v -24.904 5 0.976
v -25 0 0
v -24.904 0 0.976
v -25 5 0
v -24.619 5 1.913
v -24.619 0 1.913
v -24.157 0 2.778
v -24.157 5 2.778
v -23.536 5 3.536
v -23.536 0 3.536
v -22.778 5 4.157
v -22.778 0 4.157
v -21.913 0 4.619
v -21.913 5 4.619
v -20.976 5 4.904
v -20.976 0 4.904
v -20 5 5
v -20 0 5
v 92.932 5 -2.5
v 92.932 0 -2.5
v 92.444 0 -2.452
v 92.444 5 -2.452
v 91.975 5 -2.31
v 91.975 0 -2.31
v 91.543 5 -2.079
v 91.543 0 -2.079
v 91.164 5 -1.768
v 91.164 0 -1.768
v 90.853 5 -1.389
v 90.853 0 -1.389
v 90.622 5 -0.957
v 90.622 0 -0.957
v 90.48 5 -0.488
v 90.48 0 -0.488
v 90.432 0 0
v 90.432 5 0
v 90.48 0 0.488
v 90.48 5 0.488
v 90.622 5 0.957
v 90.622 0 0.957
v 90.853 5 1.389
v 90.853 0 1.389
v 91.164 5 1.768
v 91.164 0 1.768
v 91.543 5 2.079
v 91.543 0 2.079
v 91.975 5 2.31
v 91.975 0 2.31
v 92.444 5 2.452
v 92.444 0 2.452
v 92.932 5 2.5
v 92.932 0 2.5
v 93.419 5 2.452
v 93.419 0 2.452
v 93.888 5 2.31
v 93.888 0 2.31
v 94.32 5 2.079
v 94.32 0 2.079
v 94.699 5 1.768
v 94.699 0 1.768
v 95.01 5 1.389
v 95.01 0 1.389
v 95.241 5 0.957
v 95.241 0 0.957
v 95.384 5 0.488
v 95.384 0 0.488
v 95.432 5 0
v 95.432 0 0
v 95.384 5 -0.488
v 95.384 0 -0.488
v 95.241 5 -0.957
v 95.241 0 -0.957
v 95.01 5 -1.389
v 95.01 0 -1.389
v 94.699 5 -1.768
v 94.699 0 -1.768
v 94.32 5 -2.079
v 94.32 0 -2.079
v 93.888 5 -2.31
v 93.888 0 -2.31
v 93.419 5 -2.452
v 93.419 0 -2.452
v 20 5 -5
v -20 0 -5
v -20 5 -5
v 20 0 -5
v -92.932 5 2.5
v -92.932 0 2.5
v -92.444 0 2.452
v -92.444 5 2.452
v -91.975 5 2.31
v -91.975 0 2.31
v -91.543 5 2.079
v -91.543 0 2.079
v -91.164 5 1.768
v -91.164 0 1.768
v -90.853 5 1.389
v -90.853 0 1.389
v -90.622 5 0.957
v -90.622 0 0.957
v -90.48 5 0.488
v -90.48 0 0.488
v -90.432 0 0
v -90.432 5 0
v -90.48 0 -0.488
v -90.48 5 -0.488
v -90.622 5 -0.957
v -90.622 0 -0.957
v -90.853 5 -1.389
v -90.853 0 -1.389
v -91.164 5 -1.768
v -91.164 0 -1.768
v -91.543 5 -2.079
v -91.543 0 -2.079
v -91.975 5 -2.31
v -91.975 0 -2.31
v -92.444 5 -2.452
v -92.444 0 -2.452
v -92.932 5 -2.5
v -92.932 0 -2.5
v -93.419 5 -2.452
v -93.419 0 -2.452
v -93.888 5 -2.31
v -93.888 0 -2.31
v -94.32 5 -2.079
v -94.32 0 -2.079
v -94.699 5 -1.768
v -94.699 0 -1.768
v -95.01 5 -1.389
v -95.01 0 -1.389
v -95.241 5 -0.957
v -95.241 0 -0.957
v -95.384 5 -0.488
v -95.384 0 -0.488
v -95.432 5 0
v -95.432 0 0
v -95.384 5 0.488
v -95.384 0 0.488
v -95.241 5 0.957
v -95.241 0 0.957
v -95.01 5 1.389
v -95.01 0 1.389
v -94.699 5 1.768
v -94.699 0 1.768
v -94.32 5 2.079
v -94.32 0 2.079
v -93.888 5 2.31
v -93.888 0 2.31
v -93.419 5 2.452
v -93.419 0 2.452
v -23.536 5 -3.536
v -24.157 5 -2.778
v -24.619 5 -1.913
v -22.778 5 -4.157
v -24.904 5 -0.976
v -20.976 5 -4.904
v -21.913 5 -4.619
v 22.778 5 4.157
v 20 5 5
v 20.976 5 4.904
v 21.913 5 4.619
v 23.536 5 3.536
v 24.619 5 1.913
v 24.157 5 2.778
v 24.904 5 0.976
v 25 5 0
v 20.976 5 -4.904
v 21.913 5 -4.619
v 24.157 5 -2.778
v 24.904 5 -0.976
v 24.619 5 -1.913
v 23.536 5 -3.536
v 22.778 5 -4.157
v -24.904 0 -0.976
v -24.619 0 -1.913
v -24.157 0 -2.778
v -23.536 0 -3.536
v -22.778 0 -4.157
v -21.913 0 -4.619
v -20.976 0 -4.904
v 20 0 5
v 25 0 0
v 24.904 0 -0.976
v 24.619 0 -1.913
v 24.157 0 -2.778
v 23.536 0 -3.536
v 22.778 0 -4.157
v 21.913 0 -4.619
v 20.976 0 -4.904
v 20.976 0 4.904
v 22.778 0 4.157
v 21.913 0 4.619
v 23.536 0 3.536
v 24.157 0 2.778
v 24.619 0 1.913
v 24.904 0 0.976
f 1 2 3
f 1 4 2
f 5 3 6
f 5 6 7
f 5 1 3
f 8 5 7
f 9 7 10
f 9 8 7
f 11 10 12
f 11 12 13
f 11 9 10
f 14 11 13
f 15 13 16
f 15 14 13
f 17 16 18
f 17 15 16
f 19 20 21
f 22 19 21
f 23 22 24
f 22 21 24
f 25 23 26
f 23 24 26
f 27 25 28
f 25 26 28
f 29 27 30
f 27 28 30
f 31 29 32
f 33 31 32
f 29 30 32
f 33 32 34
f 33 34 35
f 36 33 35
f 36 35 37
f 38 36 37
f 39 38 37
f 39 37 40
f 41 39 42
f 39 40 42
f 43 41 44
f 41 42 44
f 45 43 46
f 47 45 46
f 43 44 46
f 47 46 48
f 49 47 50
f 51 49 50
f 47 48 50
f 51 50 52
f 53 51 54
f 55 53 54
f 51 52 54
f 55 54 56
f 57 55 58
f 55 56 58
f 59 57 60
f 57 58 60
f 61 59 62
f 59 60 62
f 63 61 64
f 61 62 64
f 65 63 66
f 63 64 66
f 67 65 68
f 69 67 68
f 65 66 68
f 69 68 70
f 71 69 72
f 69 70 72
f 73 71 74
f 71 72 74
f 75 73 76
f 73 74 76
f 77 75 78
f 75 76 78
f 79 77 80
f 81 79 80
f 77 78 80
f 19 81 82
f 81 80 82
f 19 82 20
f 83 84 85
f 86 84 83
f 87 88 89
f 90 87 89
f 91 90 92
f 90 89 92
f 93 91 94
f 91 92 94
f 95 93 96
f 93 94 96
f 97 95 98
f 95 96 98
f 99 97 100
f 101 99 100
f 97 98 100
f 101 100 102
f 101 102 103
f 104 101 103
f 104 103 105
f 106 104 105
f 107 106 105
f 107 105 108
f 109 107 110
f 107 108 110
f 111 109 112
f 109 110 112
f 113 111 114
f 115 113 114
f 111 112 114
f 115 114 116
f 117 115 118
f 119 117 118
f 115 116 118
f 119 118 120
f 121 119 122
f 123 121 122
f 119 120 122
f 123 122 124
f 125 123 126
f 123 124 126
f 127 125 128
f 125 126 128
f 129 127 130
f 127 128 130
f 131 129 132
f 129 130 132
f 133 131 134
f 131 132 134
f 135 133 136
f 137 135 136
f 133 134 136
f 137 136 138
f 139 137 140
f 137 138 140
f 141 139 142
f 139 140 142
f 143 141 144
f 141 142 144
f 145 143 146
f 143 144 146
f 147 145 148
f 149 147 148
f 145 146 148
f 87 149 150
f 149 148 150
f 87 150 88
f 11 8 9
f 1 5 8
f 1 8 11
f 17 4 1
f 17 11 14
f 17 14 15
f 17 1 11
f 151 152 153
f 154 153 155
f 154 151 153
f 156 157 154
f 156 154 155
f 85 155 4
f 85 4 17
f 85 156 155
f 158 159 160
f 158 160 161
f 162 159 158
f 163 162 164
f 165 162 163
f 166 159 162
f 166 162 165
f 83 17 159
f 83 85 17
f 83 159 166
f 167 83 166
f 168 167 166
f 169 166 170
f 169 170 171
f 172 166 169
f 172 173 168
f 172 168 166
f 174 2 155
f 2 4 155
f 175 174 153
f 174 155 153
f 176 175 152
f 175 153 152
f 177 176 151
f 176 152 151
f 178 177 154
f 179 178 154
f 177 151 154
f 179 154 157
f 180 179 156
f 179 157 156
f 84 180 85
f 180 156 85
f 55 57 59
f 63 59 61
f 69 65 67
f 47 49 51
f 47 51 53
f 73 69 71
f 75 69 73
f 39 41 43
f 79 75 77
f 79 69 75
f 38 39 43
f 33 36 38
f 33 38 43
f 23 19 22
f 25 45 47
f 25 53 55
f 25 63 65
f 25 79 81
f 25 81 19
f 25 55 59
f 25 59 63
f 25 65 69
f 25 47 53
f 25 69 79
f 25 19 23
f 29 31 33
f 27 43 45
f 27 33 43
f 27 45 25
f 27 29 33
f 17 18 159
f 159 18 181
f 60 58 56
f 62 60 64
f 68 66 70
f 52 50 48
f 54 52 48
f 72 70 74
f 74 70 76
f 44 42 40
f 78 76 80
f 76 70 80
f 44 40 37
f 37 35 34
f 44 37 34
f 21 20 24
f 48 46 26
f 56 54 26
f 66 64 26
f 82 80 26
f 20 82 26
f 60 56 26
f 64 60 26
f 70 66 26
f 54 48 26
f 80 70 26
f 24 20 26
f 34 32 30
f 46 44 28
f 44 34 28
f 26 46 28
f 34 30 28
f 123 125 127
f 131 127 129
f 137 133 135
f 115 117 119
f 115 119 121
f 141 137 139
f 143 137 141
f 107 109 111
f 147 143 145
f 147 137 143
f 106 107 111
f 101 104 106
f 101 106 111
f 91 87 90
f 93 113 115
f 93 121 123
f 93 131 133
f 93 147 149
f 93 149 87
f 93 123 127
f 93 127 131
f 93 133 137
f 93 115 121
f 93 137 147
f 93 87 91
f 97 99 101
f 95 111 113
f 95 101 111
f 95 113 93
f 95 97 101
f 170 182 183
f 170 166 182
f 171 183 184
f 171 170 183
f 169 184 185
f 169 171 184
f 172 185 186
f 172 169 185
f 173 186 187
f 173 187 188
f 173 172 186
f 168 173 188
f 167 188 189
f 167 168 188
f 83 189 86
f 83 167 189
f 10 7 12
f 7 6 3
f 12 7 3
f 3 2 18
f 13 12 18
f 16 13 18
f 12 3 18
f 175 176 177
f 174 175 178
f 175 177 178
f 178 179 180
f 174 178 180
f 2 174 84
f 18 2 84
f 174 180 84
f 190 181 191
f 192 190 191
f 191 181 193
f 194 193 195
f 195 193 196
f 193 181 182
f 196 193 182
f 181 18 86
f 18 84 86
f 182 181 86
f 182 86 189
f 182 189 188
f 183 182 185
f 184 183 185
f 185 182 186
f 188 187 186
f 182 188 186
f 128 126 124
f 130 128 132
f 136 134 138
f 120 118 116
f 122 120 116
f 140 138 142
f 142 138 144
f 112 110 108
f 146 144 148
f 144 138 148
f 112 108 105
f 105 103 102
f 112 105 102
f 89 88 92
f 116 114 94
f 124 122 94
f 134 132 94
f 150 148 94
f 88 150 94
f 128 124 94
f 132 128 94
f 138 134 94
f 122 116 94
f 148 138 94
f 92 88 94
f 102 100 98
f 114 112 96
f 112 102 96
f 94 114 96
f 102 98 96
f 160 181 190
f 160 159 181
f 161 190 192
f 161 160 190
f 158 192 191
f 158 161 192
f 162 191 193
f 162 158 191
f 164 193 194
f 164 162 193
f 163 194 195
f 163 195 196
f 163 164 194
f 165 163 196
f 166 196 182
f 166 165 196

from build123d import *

# Parameters (mm, degrees)
SKETCH1_R             = 2.5
BOSS_EXTRUDE1_DEPTH   = 5
BOSS_EXTRUDE1_2_DEPTH = 5
SKETCH1_W             = 50
SKETCH1_H             = 10
BOSS_EXTRUDE1_3_DEPTH = 5
FILLET1_R             = 5


with BuildPart() as part:
    # Sketch1 → Boss-Extrude1 (new body)
    with BuildSketch(Plane(origin=(0, 0, 0), x_dir=(1, 0, 0), z_dir=(0, 1, 0))):
        with Locations(Location((-92.931552942, 0, 0), (0, 0, 270))):
            Circle(SKETCH1_R)
    extrude(amount=BOSS_EXTRUDE1_DEPTH)


with BuildPart() as body_2:
    # Sketch1 → Boss-Extrude1 2 (new body)
    with BuildSketch(Plane(origin=(0, 0, 0), x_dir=(1, 0, 0), z_dir=(0, 1, 0))):
        with Locations(Location((92.931552942, 0, 0), (0, 0, 90))):
            Circle(SKETCH1_R)
    extrude(amount=BOSS_EXTRUDE1_2_DEPTH)


with BuildPart() as body_3:
    # Sketch1 → Boss-Extrude1 3 (new body)
    with BuildSketch(Plane(origin=(0, 0, 0), x_dir=(1, 0, 0), z_dir=(0, 1, 0))):
        Rectangle(SKETCH1_W, SKETCH1_H)
    extrude(amount=BOSS_EXTRUDE1_3_DEPTH)

    # Fillet1
    fillet1_edges = [body_3.edges().sort_by_distance(p)[0] for p in [
        (-25, 2.5, -5),
        (25, 2.5, -5),
        (25, 2.5, 5),
        (-25, 2.5, 5),
    ]]
    fillet(fillet1_edges, radius=FILLET1_R - 0.0001)  # a hair under: the kernel refuses the full size


solid = Compound([part.part, body_2.part, body_3.part])
